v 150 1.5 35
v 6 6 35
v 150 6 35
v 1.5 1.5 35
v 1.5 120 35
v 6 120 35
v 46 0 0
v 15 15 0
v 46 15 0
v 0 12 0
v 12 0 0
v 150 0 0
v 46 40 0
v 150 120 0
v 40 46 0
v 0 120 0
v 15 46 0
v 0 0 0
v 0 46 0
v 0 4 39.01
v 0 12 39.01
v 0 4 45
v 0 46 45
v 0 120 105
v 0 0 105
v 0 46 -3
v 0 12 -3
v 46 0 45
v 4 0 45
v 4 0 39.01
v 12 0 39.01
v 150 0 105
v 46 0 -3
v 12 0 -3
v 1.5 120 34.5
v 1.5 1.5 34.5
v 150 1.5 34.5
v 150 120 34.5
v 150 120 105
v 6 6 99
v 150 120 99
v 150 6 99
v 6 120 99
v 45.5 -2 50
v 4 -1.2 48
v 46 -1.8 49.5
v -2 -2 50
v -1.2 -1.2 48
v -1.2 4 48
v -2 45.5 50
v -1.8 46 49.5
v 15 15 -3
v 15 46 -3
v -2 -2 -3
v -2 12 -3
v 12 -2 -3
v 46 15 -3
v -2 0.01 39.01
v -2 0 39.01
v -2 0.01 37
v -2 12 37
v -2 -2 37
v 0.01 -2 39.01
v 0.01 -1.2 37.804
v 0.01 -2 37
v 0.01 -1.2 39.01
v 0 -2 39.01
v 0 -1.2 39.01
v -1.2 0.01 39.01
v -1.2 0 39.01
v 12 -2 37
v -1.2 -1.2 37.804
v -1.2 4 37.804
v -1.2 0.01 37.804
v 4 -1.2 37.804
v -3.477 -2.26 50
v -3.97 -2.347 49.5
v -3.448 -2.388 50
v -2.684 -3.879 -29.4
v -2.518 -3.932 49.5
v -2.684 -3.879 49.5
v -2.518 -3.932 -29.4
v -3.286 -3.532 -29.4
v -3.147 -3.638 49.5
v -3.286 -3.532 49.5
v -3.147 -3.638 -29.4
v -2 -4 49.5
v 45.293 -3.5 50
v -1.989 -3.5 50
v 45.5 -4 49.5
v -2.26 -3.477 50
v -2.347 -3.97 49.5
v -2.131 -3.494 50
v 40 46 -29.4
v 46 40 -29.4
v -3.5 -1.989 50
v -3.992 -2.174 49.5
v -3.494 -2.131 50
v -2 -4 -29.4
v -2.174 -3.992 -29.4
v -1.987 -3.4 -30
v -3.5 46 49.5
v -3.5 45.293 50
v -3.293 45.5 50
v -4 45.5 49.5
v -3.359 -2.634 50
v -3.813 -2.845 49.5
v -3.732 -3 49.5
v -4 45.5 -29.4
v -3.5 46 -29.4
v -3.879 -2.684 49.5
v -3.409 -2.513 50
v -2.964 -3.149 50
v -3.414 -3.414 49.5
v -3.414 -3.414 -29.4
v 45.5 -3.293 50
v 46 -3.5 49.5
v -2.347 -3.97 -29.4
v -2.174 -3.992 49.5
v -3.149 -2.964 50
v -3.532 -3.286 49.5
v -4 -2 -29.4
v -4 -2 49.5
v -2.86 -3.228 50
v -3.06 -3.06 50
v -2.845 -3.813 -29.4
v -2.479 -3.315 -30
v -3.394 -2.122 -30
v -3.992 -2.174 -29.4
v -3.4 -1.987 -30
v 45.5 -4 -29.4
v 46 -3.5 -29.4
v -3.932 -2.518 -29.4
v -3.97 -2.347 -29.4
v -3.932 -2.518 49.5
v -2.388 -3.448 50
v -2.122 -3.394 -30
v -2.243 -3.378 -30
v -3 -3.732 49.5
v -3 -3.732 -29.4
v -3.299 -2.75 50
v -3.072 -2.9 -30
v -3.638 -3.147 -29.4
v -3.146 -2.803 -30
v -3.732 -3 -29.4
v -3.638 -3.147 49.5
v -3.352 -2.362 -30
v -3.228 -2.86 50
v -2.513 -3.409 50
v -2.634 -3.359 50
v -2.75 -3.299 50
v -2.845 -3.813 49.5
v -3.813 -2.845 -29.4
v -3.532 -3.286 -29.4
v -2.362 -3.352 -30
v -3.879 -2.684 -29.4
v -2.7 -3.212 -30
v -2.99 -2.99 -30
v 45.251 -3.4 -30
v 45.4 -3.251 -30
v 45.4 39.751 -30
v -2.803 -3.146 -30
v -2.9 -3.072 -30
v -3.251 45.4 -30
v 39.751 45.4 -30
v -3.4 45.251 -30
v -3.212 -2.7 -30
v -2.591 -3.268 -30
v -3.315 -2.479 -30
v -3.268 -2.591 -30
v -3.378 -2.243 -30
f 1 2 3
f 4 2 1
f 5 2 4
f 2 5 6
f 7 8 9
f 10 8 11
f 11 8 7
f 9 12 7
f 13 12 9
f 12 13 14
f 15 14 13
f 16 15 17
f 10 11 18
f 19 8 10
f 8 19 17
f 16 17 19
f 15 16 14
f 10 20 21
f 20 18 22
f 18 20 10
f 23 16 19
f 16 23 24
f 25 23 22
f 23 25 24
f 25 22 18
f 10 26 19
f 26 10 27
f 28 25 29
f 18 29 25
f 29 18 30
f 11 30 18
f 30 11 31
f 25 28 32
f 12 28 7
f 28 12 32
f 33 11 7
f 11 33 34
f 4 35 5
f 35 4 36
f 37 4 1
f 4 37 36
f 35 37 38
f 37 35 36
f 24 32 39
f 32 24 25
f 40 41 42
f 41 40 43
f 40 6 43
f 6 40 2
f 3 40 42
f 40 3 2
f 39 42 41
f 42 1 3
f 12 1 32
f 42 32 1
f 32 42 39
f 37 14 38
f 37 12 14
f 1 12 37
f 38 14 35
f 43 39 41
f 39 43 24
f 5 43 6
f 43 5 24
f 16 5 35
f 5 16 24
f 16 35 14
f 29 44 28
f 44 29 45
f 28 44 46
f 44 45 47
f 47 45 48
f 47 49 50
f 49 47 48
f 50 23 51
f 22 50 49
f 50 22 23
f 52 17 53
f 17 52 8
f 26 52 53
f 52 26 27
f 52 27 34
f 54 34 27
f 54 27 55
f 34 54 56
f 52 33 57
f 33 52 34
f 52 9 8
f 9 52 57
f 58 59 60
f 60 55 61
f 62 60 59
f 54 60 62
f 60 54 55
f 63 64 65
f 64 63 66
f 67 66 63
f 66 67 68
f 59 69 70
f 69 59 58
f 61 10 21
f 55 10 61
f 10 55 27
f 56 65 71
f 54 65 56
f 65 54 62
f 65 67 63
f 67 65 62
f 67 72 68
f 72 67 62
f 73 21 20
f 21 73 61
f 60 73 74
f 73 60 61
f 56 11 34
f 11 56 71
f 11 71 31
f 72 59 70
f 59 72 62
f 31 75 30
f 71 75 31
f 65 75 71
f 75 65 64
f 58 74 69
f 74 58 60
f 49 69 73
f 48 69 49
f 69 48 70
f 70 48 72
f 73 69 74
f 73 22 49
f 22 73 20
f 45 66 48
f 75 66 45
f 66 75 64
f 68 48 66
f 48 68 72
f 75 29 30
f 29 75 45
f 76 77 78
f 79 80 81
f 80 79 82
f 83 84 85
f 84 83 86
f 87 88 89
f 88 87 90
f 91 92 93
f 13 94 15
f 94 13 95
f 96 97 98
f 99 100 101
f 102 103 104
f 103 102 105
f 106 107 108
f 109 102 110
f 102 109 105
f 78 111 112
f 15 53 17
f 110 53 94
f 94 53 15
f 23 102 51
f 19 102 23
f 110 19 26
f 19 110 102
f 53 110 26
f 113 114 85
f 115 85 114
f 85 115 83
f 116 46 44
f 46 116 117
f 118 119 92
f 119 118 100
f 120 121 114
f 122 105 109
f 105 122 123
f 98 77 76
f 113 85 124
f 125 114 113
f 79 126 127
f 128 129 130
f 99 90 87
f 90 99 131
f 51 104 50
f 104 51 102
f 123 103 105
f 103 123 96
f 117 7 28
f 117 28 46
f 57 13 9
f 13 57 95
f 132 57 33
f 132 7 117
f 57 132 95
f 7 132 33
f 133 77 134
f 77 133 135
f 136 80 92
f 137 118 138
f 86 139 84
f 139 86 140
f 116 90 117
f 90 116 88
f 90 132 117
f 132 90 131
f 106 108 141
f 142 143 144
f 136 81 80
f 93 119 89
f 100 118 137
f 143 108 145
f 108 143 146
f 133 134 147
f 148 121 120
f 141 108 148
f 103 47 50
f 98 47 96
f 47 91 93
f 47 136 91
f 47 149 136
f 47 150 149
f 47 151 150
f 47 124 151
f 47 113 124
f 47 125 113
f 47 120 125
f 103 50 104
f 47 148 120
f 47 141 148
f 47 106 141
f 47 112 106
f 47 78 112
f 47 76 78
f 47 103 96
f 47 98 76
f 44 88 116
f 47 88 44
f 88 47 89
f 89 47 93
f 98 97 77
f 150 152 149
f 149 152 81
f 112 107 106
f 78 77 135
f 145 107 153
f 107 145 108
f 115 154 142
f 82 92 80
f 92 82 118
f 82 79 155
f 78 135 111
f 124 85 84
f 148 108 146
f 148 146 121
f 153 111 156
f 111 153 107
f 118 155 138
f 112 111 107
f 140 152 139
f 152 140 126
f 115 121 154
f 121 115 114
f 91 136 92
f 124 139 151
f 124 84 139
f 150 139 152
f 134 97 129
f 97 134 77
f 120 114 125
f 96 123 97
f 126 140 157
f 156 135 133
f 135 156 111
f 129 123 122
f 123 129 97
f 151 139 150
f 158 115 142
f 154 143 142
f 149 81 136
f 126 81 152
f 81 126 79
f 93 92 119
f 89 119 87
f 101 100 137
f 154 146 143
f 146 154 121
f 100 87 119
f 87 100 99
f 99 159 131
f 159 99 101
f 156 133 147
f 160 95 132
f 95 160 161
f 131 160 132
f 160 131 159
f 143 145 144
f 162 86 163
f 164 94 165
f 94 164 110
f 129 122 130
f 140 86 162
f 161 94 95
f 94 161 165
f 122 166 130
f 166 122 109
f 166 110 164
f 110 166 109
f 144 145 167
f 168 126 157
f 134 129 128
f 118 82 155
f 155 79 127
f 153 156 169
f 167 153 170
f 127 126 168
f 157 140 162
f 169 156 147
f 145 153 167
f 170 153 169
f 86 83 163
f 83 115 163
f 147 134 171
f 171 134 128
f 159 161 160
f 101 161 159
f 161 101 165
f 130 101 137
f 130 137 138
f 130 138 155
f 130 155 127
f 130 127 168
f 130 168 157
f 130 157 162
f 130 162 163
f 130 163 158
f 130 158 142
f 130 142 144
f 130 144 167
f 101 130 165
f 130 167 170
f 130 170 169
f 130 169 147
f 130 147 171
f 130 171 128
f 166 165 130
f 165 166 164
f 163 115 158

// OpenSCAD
// file: canto_sama3.scad
// =====================================================================
//  SAMA 3: peça de canto (pé + capa da quina do perfil + luva da cúpula)
//  Imprimir 4 peças iguais em PLA. A peça é simétrica na diagonal,
//  então a mesma peça serve nos 4 cantos.
//
//  Maquete: base 1000 x 800 mm, 35 mm de altura, perfil de alumínio
//  em volta. Cúpula de acrílico 6 mm apoiada em cima da base.
//
//  Princípio: a face interna da parede em L é UM plano contínuo.
//    - embaixo ela encosta no perfil de alumínio (face externa da base);
//    - em cima ela encosta no acrílico (face externa da cúpula).
//  Como os dois encostam no mesmo plano, a cúpula fica RENTE à base
//  por construção e nunca passa para fora. Só a peça de PLA fica
//  4 mm para fora, nos cantos, cobrindo a quina imperfeita do perfil.
//
//  Origem: quina externa da base (encontro das duas faces externas do
//  perfil), na altura da FACE DE BAIXO da base. +X e +Y entram na base,
//  +Z para cima.  Mesa = -30, fundo da base = 0, topo da base = +35.
//  Medidas em mm.
// =====================================================================

/* [Maquete (medidas reais)] */
altura_base = 35;          // base com perfil
altura_pe   = 30;          // "pezinho de 3 cm": levanta a base da mesa

/* [Peça] */
parede      = 4;           // espessura da parede (é o quanto a peça fica para fora)
braco       = 50;          // comprimento externo de cada braço do L
luva_acima  = 15;          // quanto a parede sobe acima do topo da base (cobre o acrílico)
funil_h     = 2;           // funil de entrada da cúpula: abertura horizontal
funil_v     = 5;           // funil de entrada da cúpula: altura

/* [Alívios para o perfil imperfeito] */
bolsa_prof  = 2;           // bolsa na quina do perfil: profundidade na parede
bolsa_comp  = 12;          // bolsa: comprimento a partir da quina (em cada face)
bolsa_acima = 2;           // bolsa sobe até topo da base + isto (depois teto 45°)
faixa_larg  = 15;          // rebaixo no topo do pé (aba de baixo do perfil / rebarba)
faixa_prof  = 3;
entalhe_prof = 1.2;        // entalhe vertical na quina (cola/aresta da caixa de acrílico)
entalhe_comp = 4;

/* [Ajuste se o acrílico for MENOR que a base] */
recuo = 0;                 // 0 = rente. Caixa menor em D (total) -> recuo = D/2. Máx 2.

/* [Acabamento] */
raio_quina   = 2;          // arredondamento da quina externa vertical
chanfro_base = 0.6;        // chanfro na borda de baixo (pé de elefante)
chanfro_cosm = 0.5;        // chanfro nas bordas externas visíveis
chanfro_pe   = 6;          // chanfro do canto interno do pé (economia/visual)

/* [Fixação opcional (desligada no teste)] */
furo_parafuso   = false;   // rasgo diagonal para parafuso 3,5 mm de baixo para cima
rasgo_larg      = 4.2;
rasgo_curso     = 5;       // folga de ajuste ao longo da diagonal
rebaixo_larg    = 9;       // cabeça do parafuso
alma_parafuso   = 6;       // PLA que sobra entre a cabeça e a base
pele_sacrificio = 0.2;     // camada para não precisar de ponte; furar com broca 4

/* [Saída] */
teste_rapido = false;      // só a fatia de cima (25 mm) para testar o encaixe
teste_z0     = 25;

$fn = 64;
e = 0.01;

// ---------- derivadas ----------
L     = braco - parede;               // comprimento da face de referência (46)
z_top = altura_base + luva_acima;     // topo da peça (50)
z_fun = z_top - funil_v;              // início do funil (45)
z_bol = altura_base + bolsa_acima;    // topo reto da bolsa (37)
z_rec = altura_base + bolsa_acima;    // início do recuo (37), sempre acima do perfil
G     = L + 10;                       // cavidade passa das pontas dos braços

assert(recuo >= 0 && recuo <= 2, "recuo deve ficar entre 0 e 2 mm");
assert(funil_h < parede, "funil maior que a parede");
assert(bolsa_prof < parede, "bolsa maior que a parede");

echo(str("Altura total: ", altura_pe + z_top, " mm | parede para fora da base: ", parede, " mm"));
echo(str("Apoio da base no pé: ", L - faixa_larg, " x ", L - faixa_larg, " mm"));

// ---------- contorno externo (convexo) ----------
module contorno() {
    polygon(concat(
        // quina externa arredondada (centro em -parede+raio)
        [for (a = [180:5:270]) [-parede + raio_quina + raio_quina*cos(a),
                                -parede + raio_quina + raio_quina*sin(a)]],
        [[L - chanfro_cosm, -parede], [L, -parede + chanfro_cosm],
         [L, L - chanfro_pe], [L - chanfro_pe, L],
         [-parede + chanfro_cosm, L], [-parede, L - chanfro_cosm]]
    ));
}

module lamina(z, d = 0) {   // contorno fino na altura z, recuado d
    translate([0, 0, z]) linear_extrude(e) offset(delta = -d) contorno();
}

// casca externa com chanfro embaixo e no topo
module casca() {
    hull() {
        lamina(-altura_pe, chanfro_base);
        lamina(-altura_pe + chanfro_base);
        lamina(z_top - chanfro_cosm - e);
        lamina(z_top - e, chanfro_cosm);
    }
}

// ---------- cavidade (onde ficam base e acrílico) ----------
module quadrante(z, o) {    // quadrante interno a partir de (o,o)
    translate([o, o, z]) cube([G - o, G - o, e]);
}

module cavidade() {
    r = recuo;
    // base + perfil: plano de referência em x=0 / y=0
    hull() { quadrante(0, 0); quadrante(z_rec, 0); }
    if (r > 0) {
        hull() { quadrante(z_rec, 0); quadrante(z_rec + r, r); }   // degrau a 45°
        hull() { quadrante(z_rec + r, r); quadrante(z_fun, r); }
    } else {
        hull() { quadrante(z_rec, 0); quadrante(z_fun, 0); }
    }
    // funil de entrada
    hull() { quadrante(z_fun, r); quadrante(z_top, r - funil_h); }
    hull() { quadrante(z_top, r - funil_h); quadrante(z_top + 1, r - funil_h); }
}

// ---------- alívios ----------
module em_L(a, b, c, z0, z1) {  // L nas duas faces: faixa [a,b] na parede, até c ao longo
    translate([a, a, z0]) cube([b - a, c - a, z1 - z0]);
    translate([a, a, z0]) cube([c - a, b - a, z1 - z0]);
}

module bolsa_quina() {          // bolsa da quina do perfil, com teto a 45°
    for (m = [0, 1]) mirror(m ? [1, -1, 0] : [0, 0, 0])
        hull() {
            translate([-bolsa_prof, -bolsa_prof, -faixa_prof])
                cube([bolsa_prof + e, bolsa_comp + bolsa_prof, z_bol + faixa_prof]);
            translate([0, -bolsa_prof, z_bol + bolsa_prof])
                cube([e, bolsa_comp + bolsa_prof, e]);
        }
}

module entalhe_quina() {        // entalhe vertical para a aresta colada do acrílico
    em_L(-entalhe_prof, e, entalhe_comp, -faixa_prof, z_rec + recuo + e);
    if (recuo > 0)
        translate([recuo, recuo, 0])
            em_L(-entalhe_prof, e, entalhe_comp, z_rec, z_top + 1);
    else
        em_L(-entalhe_prof, e, entalhe_comp, z_rec, z_top + 1);
}

module faixa_pe() {             // rebaixo no topo do pé, junto ao perfil
    translate([0, 0, -faixa_prof]) cube([faixa_larg, G, faixa_prof + e]);
    translate([0, 0, -faixa_prof]) cube([G, faixa_larg, faixa_prof + e]);
}

module rasgo_parafuso() {
    c1 = (L + faixa_larg) / 2 - rasgo_curso / (2*sqrt(2));
    c2 = (L + faixa_larg) / 2 + rasgo_curso / (2*sqrt(2));
    z_reb = -alma_parafuso;
    hull() for (c = [c1, c2]) translate([c, c, z_reb + pele_sacrificio])
        cylinder(d = rasgo_larg, h = alma_parafuso);
    hull() for (c = [c1, c2]) translate([c, c, -altura_pe - 1])
        cylinder(d = rebaixo_larg, h = altura_pe - alma_parafuso + 1);
}

// ---------- peça ----------
module peca() {
    difference() {
        casca();
        cavidade();
        faixa_pe();
        bolsa_quina();
        entalhe_quina();
        if (furo_parafuso) rasgo_parafuso();
    }
}

if (teste_rapido)
    translate([0, 0, -teste_z0])
    intersection() {
        peca();
        translate([-50, -50, teste_z0]) cube([200, 200, 100]);
    }
else
    translate([0, 0, altura_pe]) peca();   // mesa em z=0 para exportar
// main file
// Visualização (não imprimir): peças de canto + base com perfil + cúpula.
// vista = "canto"  -> close de um canto
// vista = "geral"  -> maquete inteira 1000 x 800
use <canto_sama3.scad>

vista        = "canto";
base_x       = 1000;
base_y       = 800;
altura_base  = 35;
altura_pe    = 30;
perfil_esp   = 1.5;     // só para desenhar o alumínio
acrilico     = 6;
cupula_h     = 250;     // altura da cúpula (desenho)

module base_com_perfil(X, Y) {
    color("burlywood") translate([perfil_esp, perfil_esp, 0])
        cube([X - 2*perfil_esp, Y - 2*perfil_esp, altura_base - 0.5]);
    color("silver") difference() {
        cube([X, Y, altura_base]);
        translate([perfil_esp, perfil_esp, -1]) cube([X - 2*perfil_esp, Y - 2*perfil_esp, altura_base + 2]);
    }
}

module cupula(X, Y, H) {
    color("lightskyblue", 0.35) translate([0, 0, altura_base]) difference() {
        cube([X, Y, H]);
        translate([acrilico, acrilico, -1]) cube([X - 2*acrilico, Y - 2*acrilico, H - acrilico + 1]);
    }
}

module cantos(X, Y) {
    color("#2b2b2b") {
        peca();
        translate([X, 0, 0]) mirror([1, 0, 0]) peca();
        translate([0, Y, 0]) mirror([0, 1, 0]) peca();
        translate([X, Y, 0]) mirror([1, 0, 0]) mirror([0, 1, 0]) peca();
    }
}

if (vista == "geral") {
    base_com_perfil(base_x, base_y);
    cupula(base_x, base_y, cupula_h);
    cantos(base_x, base_y);
} else {
    X = 160; Y = 130;     // trecho do canto
    intersection() {
        union() { base_com_perfil(base_x, base_y); cupula(base_x, base_y, 70); }
        translate([-10, -10, -40]) cube([X, Y, 200]);
    }
    color("#2b2b2b") peca();
}
